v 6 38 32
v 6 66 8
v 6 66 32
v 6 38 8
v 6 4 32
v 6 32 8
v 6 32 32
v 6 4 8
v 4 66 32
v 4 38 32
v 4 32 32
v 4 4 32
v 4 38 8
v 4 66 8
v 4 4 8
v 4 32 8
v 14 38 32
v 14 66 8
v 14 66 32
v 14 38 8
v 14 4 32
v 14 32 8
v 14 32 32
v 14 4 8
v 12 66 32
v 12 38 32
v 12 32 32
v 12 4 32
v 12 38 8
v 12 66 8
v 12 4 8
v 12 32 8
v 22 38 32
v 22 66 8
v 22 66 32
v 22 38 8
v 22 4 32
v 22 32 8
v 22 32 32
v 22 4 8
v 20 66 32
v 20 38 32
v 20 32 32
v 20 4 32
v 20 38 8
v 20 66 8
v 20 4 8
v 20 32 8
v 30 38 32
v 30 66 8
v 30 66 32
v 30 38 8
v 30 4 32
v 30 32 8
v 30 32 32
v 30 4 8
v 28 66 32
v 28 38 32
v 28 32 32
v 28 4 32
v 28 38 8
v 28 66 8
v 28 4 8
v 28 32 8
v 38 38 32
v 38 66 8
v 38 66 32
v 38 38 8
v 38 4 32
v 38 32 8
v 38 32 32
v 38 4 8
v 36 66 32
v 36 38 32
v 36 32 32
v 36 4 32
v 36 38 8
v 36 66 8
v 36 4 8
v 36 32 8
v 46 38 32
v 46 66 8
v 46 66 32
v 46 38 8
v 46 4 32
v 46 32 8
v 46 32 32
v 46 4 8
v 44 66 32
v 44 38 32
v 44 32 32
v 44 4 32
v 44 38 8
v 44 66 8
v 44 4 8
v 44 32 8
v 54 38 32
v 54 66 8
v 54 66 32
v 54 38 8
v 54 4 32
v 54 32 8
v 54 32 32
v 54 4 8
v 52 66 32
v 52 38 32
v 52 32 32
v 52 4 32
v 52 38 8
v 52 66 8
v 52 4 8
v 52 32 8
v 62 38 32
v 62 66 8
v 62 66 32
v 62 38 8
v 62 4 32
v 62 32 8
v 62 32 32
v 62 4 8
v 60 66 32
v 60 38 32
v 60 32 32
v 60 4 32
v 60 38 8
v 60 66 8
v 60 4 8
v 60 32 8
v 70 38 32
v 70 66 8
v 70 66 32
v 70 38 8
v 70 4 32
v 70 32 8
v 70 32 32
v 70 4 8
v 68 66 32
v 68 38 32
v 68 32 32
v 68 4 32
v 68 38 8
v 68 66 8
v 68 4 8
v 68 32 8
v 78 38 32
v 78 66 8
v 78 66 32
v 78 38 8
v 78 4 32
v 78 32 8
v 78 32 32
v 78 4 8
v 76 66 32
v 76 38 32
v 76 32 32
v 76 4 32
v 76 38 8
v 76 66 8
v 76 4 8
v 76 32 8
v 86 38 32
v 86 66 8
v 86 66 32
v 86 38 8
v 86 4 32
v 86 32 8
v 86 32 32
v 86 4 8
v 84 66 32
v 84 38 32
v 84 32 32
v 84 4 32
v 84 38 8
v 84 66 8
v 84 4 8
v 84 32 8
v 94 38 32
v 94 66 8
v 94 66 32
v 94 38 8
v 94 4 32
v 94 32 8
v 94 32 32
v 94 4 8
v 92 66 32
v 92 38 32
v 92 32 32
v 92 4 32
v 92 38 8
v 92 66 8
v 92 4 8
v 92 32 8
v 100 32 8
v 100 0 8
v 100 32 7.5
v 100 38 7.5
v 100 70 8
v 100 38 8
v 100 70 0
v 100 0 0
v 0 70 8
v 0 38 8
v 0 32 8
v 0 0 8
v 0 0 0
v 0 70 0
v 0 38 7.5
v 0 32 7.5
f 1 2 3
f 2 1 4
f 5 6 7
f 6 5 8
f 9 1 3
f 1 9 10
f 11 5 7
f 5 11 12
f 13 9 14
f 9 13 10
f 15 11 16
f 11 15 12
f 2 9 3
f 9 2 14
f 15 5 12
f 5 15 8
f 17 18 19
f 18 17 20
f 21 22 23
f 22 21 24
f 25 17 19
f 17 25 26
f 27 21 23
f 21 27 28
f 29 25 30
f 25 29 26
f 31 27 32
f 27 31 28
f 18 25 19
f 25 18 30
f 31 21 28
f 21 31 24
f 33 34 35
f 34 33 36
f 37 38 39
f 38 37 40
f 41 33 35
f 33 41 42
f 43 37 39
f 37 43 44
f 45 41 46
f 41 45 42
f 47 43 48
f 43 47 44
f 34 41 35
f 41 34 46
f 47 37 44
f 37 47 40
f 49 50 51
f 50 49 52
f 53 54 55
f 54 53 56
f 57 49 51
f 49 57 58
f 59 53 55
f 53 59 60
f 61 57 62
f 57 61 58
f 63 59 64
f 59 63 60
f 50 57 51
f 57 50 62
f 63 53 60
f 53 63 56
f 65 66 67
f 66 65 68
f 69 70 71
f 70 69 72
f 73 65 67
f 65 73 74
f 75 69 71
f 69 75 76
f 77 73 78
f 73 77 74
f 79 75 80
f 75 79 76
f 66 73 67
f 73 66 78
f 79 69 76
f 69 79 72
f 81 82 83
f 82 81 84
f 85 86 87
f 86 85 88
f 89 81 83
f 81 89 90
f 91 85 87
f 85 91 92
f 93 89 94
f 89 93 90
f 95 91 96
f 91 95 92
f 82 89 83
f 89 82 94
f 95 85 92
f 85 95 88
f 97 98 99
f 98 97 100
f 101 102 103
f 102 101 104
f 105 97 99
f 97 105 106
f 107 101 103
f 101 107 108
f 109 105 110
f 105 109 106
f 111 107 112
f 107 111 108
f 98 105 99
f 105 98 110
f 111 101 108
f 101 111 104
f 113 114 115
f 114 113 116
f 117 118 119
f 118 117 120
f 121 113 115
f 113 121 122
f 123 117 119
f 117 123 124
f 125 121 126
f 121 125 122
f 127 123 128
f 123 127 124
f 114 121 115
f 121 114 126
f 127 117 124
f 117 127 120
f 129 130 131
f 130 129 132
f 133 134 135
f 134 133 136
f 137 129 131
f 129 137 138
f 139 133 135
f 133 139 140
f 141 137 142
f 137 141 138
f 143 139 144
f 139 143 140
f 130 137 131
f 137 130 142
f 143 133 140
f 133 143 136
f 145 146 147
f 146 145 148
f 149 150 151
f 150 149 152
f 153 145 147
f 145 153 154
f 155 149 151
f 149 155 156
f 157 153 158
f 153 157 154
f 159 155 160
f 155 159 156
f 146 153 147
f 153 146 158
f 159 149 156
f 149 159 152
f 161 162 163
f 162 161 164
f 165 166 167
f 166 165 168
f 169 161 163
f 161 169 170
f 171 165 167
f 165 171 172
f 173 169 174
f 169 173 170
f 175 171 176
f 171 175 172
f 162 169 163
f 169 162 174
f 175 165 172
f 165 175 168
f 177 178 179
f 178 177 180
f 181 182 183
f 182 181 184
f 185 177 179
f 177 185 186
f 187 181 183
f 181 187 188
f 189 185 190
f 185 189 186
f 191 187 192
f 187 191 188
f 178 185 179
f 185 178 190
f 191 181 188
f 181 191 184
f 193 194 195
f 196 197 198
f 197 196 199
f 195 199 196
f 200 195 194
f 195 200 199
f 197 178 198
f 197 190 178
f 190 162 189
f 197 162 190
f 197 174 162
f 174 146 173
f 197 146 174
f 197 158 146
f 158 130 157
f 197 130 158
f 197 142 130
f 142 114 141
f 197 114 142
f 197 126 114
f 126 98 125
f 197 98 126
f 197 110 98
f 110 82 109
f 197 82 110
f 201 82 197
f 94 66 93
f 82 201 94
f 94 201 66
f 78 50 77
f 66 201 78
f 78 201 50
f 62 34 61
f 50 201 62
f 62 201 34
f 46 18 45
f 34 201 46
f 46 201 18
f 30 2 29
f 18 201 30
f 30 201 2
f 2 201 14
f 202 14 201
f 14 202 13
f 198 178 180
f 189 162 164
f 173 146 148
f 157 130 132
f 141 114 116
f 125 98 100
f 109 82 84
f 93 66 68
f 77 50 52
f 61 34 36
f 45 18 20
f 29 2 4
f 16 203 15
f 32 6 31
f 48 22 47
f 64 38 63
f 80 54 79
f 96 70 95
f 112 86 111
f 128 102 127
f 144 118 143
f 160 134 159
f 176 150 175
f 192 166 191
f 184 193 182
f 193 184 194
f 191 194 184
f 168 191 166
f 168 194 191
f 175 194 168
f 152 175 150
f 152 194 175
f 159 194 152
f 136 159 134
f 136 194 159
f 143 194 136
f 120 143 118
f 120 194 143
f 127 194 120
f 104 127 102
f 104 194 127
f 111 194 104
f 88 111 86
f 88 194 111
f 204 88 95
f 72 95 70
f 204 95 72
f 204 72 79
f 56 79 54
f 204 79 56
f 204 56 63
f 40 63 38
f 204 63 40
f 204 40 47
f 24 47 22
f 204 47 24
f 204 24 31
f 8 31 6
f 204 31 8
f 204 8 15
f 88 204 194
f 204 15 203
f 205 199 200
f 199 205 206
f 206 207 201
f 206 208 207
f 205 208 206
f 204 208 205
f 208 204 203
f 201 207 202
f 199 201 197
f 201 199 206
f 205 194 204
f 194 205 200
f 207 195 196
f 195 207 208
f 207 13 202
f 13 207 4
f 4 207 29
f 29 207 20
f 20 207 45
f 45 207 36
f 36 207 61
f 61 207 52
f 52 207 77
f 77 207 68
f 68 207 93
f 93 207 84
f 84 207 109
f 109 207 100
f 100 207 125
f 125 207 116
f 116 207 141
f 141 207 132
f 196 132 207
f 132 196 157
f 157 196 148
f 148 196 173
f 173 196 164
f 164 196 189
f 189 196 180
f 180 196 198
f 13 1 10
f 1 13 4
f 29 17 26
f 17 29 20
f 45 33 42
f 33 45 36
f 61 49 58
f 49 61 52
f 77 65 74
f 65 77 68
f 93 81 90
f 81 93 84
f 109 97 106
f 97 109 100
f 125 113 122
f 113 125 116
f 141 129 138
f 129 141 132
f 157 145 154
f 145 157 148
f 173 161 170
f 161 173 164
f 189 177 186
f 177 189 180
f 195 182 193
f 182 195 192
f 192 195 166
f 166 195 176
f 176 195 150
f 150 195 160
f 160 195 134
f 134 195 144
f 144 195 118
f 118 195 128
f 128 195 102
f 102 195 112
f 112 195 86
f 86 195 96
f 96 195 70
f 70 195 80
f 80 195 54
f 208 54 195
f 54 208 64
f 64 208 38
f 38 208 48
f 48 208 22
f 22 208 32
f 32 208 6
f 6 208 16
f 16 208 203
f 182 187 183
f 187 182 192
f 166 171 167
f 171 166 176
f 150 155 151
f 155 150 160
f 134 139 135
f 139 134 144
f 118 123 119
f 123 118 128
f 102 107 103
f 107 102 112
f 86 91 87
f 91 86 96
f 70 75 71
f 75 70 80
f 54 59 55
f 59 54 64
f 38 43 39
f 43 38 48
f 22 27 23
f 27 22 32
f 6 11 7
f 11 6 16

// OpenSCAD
$fn = 32;

// ----------------------------------------------------------------------
// Heatsink: slotted fin block
// ----------------------------------------------------------------------

// --- parameters (mm) ---
base_l = 100;             // base length, X
base_w = 70;              // base width, Y
base_t = 8;               // base plate thickness
fin_h = 25;               // fin height above the base
fin_t = 2;                // fin thickness
edge = 4;                 // margin from the base ends
pitch = 8;                // fin pitch
slot_w = 6;               // central slot width, Y

n_fins = floor((base_l - 2 * edge - fin_t) / pitch) + 1;  // fin count
total_h = base_t + fin_h - 1;  // overall height

difference() {
union() {
  cube([base_l, base_w, base_t]);
  for (i = [0 : n_fins - 1])
    translate([edge + i * pitch, edge, base_t - 1])
      cube([fin_t, base_w - 2 * edge, fin_h]);
}
  translate([-1, base_w / 2 - slot_w / 2, base_t - 0.5])
    cube([base_l + 2, slot_w, fin_h + 2]);
}
